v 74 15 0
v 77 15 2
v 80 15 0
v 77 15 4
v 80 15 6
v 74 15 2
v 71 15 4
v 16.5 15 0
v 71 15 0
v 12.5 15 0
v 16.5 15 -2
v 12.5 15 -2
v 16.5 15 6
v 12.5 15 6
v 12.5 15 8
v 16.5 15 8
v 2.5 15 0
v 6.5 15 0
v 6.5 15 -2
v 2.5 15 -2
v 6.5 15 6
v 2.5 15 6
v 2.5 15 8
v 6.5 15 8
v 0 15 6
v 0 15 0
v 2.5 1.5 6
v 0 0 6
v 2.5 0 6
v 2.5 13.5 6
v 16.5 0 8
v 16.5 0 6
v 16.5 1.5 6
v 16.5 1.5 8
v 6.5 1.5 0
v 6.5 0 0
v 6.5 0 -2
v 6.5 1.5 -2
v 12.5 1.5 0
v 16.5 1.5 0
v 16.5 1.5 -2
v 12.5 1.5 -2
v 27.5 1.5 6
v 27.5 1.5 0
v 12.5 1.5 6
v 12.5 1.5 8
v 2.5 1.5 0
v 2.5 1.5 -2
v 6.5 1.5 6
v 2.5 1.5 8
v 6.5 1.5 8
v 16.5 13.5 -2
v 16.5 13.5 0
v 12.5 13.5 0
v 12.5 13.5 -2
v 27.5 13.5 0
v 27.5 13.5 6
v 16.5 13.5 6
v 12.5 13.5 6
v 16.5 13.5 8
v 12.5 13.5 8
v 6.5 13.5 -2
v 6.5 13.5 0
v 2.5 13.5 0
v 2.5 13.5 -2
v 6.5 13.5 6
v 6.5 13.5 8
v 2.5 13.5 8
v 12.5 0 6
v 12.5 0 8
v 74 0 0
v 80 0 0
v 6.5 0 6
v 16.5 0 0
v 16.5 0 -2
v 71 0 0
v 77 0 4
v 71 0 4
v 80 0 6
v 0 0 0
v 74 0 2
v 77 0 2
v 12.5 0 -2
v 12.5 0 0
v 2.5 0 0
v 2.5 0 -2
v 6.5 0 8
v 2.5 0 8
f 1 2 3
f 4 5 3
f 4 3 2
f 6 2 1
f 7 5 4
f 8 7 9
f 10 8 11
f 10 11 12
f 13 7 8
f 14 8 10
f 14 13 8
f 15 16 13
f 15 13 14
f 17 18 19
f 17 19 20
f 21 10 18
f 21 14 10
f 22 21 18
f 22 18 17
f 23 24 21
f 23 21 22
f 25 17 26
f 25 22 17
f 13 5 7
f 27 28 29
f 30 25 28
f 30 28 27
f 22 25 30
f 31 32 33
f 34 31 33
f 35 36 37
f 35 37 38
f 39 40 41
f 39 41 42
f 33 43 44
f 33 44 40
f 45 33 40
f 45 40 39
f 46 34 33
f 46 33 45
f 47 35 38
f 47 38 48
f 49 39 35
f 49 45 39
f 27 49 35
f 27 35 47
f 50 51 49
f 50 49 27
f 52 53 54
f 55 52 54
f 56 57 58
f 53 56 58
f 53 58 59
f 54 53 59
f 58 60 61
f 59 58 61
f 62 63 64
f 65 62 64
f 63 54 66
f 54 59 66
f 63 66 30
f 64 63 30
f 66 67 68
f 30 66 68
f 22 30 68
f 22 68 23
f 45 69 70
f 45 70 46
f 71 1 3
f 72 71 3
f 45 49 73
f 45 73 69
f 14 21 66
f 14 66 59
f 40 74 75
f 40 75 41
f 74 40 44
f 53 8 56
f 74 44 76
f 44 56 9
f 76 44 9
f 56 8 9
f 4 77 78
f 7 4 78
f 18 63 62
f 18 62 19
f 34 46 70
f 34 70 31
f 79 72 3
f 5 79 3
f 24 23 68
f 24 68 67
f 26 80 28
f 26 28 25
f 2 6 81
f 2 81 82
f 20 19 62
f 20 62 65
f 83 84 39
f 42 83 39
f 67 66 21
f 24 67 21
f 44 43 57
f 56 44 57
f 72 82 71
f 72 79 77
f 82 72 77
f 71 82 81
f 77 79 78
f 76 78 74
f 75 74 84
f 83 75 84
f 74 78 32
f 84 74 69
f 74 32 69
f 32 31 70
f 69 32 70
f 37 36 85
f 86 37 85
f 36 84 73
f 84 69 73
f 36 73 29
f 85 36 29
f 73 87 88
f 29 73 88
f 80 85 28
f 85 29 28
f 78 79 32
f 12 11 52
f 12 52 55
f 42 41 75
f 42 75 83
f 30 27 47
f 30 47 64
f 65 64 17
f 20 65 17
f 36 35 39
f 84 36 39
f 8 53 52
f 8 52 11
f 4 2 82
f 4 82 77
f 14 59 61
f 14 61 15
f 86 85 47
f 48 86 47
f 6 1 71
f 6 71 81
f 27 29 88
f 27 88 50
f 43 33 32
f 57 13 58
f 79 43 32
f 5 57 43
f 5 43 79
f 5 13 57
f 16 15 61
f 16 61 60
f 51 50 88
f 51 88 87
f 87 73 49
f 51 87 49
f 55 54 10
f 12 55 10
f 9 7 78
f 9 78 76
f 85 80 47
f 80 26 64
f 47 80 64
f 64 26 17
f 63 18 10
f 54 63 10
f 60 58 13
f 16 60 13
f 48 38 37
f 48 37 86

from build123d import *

# Parameters (mm, degrees)
SKETCH1_W           = 80
SKETCH1_H           = 15
BOSS_EXTRUDE1_DEPTH = 6
CUT_EXTRUDE1_DEPTH  = 82.614949611
SKETCH3_W           = 25
SKETCH3_H           = 12
CUT_EXTRUDE2_DEPTH  = 82.614949611
SKETCH4_W           = 4
SKETCH4_H           = 1.5
BOSS_EXTRUDE2_DEPTH = 2
SKETCH5_W           = 4
SKETCH5_H           = 1.5
BOSS_EXTRUDE3_DEPTH = 2
SKETCH6_W           = 4
SKETCH6_H           = 1.5
BOSS_EXTRUDE4_DEPTH = 2
SKETCH7_W           = 4
SKETCH7_H           = 1.5
BOSS_EXTRUDE5_DEPTH = 2
SKETCH9_W           = 4
SKETCH9_H           = 1.5
BOSS_EXTRUDE6_DEPTH = 2
SKETCH10_W          = 4
SKETCH10_H          = 1.5
BOSS_EXTRUDE7_DEPTH = 2
SKETCH12_W          = 4
SKETCH12_H          = 1.5
BOSS_EXTRUDE8_DEPTH = 2
SKETCH12_3_W        = 4
SKETCH12_3_H        = 1.5
BOSS_EXTRUDE9_DEPTH = 2


with BuildPart() as part:
    # Sketch1 → Boss-Extrude1 (new body)
    with BuildSketch(Plane.XY):
        with Locations((40, 7.5)):
            Rectangle(SKETCH1_W, SKETCH1_H)
    extrude(amount=BOSS_EXTRUDE1_DEPTH)

    # Sketch2 → Cut-Extrude1 (cut, through all)
    with BuildSketch(Plane(origin=(0, 15, 0), x_dir=(1, 0, 0), z_dir=(0, 1, 0))):
        Polygon((74, 0), (74, -2), (77, -2), (77, -4), (71, -4), (71, 0), align=None)
    extrude(amount=-CUT_EXTRUDE1_DEPTH, mode=Mode.SUBTRACT)

    # Sketch3 → Cut-Extrude2 (cut, through all)
    with BuildSketch(Plane.XY.offset(6)):
        with Locations((15, 7.5)):
            Rectangle(SKETCH3_W, SKETCH3_H)
    extrude(amount=-CUT_EXTRUDE2_DEPTH, mode=Mode.SUBTRACT)

    # Sketch4 → Boss-Extrude2 (add)
    with BuildSketch(Plane.XY.offset(6)):
        with Locations((4.5, 14.25)):
            Rectangle(SKETCH4_W, SKETCH4_H)
    extrude(amount=BOSS_EXTRUDE2_DEPTH)

    # Sketch5 → Boss-Extrude3 (add)
    with BuildSketch(Plane.XY.offset(6)):
        with Locations((14.5, 14.25)):
            Rectangle(SKETCH5_W, SKETCH5_H)
    extrude(amount=BOSS_EXTRUDE3_DEPTH)

    # Sketch6 → Boss-Extrude4 (add)
    with BuildSketch(Plane.XY.offset(6)):
        with Locations((4.5, 0.75)):
            Rectangle(SKETCH6_W, SKETCH6_H)
    extrude(amount=BOSS_EXTRUDE4_DEPTH)

    # Sketch7 → Boss-Extrude5 (add)
    with BuildSketch(Plane.XY.offset(6)):
        with Locations((14.5, 0.75)):
            Rectangle(SKETCH7_W, SKETCH7_H)
    extrude(amount=BOSS_EXTRUDE5_DEPTH)

    # Sketch9 → Boss-Extrude6 (add)
    with BuildSketch(Plane(origin=(0, 0, 0), x_dir=(-1, 0, 0), z_dir=(0, 0, -1))):
        with Locations((-4.5, 14.25)):
            Rectangle(SKETCH9_W, SKETCH9_H)
    extrude(amount=BOSS_EXTRUDE6_DEPTH)

    # Sketch10 → Boss-Extrude7 (add)
    with BuildSketch(Plane(origin=(0, 0, 0), x_dir=(-1, 0, 0), z_dir=(0, 0, -1))):
        with Locations((-14.5, 14.25)):
            Rectangle(SKETCH10_W, SKETCH10_H)
    extrude(amount=BOSS_EXTRUDE7_DEPTH)

    # Sketch12 → Boss-Extrude8 (add)
    with BuildSketch(Plane(origin=(0, 0, 0), x_dir=(-1, 0, 0), z_dir=(0, 0, -1))):
        with Locations((-14.5, 0.75)):
            Rectangle(SKETCH12_W, SKETCH12_H)
    extrude(amount=BOSS_EXTRUDE8_DEPTH)

    # Sketch12<3> → Boss-Extrude9 (add)
    with BuildSketch(Plane(origin=(0, 0, 0), x_dir=(-1, 0, 0), z_dir=(0, 0, -1))):
        with Locations((-4.5, 0.75)):
            Rectangle(SKETCH12_3_W, SKETCH12_3_H)
        with Locations((-14.5, 0.75)):
            Rectangle(SKETCH12_3_W, SKETCH12_3_H)
    extrude(amount=BOSS_EXTRUDE9_DEPTH)


solid = part.part
